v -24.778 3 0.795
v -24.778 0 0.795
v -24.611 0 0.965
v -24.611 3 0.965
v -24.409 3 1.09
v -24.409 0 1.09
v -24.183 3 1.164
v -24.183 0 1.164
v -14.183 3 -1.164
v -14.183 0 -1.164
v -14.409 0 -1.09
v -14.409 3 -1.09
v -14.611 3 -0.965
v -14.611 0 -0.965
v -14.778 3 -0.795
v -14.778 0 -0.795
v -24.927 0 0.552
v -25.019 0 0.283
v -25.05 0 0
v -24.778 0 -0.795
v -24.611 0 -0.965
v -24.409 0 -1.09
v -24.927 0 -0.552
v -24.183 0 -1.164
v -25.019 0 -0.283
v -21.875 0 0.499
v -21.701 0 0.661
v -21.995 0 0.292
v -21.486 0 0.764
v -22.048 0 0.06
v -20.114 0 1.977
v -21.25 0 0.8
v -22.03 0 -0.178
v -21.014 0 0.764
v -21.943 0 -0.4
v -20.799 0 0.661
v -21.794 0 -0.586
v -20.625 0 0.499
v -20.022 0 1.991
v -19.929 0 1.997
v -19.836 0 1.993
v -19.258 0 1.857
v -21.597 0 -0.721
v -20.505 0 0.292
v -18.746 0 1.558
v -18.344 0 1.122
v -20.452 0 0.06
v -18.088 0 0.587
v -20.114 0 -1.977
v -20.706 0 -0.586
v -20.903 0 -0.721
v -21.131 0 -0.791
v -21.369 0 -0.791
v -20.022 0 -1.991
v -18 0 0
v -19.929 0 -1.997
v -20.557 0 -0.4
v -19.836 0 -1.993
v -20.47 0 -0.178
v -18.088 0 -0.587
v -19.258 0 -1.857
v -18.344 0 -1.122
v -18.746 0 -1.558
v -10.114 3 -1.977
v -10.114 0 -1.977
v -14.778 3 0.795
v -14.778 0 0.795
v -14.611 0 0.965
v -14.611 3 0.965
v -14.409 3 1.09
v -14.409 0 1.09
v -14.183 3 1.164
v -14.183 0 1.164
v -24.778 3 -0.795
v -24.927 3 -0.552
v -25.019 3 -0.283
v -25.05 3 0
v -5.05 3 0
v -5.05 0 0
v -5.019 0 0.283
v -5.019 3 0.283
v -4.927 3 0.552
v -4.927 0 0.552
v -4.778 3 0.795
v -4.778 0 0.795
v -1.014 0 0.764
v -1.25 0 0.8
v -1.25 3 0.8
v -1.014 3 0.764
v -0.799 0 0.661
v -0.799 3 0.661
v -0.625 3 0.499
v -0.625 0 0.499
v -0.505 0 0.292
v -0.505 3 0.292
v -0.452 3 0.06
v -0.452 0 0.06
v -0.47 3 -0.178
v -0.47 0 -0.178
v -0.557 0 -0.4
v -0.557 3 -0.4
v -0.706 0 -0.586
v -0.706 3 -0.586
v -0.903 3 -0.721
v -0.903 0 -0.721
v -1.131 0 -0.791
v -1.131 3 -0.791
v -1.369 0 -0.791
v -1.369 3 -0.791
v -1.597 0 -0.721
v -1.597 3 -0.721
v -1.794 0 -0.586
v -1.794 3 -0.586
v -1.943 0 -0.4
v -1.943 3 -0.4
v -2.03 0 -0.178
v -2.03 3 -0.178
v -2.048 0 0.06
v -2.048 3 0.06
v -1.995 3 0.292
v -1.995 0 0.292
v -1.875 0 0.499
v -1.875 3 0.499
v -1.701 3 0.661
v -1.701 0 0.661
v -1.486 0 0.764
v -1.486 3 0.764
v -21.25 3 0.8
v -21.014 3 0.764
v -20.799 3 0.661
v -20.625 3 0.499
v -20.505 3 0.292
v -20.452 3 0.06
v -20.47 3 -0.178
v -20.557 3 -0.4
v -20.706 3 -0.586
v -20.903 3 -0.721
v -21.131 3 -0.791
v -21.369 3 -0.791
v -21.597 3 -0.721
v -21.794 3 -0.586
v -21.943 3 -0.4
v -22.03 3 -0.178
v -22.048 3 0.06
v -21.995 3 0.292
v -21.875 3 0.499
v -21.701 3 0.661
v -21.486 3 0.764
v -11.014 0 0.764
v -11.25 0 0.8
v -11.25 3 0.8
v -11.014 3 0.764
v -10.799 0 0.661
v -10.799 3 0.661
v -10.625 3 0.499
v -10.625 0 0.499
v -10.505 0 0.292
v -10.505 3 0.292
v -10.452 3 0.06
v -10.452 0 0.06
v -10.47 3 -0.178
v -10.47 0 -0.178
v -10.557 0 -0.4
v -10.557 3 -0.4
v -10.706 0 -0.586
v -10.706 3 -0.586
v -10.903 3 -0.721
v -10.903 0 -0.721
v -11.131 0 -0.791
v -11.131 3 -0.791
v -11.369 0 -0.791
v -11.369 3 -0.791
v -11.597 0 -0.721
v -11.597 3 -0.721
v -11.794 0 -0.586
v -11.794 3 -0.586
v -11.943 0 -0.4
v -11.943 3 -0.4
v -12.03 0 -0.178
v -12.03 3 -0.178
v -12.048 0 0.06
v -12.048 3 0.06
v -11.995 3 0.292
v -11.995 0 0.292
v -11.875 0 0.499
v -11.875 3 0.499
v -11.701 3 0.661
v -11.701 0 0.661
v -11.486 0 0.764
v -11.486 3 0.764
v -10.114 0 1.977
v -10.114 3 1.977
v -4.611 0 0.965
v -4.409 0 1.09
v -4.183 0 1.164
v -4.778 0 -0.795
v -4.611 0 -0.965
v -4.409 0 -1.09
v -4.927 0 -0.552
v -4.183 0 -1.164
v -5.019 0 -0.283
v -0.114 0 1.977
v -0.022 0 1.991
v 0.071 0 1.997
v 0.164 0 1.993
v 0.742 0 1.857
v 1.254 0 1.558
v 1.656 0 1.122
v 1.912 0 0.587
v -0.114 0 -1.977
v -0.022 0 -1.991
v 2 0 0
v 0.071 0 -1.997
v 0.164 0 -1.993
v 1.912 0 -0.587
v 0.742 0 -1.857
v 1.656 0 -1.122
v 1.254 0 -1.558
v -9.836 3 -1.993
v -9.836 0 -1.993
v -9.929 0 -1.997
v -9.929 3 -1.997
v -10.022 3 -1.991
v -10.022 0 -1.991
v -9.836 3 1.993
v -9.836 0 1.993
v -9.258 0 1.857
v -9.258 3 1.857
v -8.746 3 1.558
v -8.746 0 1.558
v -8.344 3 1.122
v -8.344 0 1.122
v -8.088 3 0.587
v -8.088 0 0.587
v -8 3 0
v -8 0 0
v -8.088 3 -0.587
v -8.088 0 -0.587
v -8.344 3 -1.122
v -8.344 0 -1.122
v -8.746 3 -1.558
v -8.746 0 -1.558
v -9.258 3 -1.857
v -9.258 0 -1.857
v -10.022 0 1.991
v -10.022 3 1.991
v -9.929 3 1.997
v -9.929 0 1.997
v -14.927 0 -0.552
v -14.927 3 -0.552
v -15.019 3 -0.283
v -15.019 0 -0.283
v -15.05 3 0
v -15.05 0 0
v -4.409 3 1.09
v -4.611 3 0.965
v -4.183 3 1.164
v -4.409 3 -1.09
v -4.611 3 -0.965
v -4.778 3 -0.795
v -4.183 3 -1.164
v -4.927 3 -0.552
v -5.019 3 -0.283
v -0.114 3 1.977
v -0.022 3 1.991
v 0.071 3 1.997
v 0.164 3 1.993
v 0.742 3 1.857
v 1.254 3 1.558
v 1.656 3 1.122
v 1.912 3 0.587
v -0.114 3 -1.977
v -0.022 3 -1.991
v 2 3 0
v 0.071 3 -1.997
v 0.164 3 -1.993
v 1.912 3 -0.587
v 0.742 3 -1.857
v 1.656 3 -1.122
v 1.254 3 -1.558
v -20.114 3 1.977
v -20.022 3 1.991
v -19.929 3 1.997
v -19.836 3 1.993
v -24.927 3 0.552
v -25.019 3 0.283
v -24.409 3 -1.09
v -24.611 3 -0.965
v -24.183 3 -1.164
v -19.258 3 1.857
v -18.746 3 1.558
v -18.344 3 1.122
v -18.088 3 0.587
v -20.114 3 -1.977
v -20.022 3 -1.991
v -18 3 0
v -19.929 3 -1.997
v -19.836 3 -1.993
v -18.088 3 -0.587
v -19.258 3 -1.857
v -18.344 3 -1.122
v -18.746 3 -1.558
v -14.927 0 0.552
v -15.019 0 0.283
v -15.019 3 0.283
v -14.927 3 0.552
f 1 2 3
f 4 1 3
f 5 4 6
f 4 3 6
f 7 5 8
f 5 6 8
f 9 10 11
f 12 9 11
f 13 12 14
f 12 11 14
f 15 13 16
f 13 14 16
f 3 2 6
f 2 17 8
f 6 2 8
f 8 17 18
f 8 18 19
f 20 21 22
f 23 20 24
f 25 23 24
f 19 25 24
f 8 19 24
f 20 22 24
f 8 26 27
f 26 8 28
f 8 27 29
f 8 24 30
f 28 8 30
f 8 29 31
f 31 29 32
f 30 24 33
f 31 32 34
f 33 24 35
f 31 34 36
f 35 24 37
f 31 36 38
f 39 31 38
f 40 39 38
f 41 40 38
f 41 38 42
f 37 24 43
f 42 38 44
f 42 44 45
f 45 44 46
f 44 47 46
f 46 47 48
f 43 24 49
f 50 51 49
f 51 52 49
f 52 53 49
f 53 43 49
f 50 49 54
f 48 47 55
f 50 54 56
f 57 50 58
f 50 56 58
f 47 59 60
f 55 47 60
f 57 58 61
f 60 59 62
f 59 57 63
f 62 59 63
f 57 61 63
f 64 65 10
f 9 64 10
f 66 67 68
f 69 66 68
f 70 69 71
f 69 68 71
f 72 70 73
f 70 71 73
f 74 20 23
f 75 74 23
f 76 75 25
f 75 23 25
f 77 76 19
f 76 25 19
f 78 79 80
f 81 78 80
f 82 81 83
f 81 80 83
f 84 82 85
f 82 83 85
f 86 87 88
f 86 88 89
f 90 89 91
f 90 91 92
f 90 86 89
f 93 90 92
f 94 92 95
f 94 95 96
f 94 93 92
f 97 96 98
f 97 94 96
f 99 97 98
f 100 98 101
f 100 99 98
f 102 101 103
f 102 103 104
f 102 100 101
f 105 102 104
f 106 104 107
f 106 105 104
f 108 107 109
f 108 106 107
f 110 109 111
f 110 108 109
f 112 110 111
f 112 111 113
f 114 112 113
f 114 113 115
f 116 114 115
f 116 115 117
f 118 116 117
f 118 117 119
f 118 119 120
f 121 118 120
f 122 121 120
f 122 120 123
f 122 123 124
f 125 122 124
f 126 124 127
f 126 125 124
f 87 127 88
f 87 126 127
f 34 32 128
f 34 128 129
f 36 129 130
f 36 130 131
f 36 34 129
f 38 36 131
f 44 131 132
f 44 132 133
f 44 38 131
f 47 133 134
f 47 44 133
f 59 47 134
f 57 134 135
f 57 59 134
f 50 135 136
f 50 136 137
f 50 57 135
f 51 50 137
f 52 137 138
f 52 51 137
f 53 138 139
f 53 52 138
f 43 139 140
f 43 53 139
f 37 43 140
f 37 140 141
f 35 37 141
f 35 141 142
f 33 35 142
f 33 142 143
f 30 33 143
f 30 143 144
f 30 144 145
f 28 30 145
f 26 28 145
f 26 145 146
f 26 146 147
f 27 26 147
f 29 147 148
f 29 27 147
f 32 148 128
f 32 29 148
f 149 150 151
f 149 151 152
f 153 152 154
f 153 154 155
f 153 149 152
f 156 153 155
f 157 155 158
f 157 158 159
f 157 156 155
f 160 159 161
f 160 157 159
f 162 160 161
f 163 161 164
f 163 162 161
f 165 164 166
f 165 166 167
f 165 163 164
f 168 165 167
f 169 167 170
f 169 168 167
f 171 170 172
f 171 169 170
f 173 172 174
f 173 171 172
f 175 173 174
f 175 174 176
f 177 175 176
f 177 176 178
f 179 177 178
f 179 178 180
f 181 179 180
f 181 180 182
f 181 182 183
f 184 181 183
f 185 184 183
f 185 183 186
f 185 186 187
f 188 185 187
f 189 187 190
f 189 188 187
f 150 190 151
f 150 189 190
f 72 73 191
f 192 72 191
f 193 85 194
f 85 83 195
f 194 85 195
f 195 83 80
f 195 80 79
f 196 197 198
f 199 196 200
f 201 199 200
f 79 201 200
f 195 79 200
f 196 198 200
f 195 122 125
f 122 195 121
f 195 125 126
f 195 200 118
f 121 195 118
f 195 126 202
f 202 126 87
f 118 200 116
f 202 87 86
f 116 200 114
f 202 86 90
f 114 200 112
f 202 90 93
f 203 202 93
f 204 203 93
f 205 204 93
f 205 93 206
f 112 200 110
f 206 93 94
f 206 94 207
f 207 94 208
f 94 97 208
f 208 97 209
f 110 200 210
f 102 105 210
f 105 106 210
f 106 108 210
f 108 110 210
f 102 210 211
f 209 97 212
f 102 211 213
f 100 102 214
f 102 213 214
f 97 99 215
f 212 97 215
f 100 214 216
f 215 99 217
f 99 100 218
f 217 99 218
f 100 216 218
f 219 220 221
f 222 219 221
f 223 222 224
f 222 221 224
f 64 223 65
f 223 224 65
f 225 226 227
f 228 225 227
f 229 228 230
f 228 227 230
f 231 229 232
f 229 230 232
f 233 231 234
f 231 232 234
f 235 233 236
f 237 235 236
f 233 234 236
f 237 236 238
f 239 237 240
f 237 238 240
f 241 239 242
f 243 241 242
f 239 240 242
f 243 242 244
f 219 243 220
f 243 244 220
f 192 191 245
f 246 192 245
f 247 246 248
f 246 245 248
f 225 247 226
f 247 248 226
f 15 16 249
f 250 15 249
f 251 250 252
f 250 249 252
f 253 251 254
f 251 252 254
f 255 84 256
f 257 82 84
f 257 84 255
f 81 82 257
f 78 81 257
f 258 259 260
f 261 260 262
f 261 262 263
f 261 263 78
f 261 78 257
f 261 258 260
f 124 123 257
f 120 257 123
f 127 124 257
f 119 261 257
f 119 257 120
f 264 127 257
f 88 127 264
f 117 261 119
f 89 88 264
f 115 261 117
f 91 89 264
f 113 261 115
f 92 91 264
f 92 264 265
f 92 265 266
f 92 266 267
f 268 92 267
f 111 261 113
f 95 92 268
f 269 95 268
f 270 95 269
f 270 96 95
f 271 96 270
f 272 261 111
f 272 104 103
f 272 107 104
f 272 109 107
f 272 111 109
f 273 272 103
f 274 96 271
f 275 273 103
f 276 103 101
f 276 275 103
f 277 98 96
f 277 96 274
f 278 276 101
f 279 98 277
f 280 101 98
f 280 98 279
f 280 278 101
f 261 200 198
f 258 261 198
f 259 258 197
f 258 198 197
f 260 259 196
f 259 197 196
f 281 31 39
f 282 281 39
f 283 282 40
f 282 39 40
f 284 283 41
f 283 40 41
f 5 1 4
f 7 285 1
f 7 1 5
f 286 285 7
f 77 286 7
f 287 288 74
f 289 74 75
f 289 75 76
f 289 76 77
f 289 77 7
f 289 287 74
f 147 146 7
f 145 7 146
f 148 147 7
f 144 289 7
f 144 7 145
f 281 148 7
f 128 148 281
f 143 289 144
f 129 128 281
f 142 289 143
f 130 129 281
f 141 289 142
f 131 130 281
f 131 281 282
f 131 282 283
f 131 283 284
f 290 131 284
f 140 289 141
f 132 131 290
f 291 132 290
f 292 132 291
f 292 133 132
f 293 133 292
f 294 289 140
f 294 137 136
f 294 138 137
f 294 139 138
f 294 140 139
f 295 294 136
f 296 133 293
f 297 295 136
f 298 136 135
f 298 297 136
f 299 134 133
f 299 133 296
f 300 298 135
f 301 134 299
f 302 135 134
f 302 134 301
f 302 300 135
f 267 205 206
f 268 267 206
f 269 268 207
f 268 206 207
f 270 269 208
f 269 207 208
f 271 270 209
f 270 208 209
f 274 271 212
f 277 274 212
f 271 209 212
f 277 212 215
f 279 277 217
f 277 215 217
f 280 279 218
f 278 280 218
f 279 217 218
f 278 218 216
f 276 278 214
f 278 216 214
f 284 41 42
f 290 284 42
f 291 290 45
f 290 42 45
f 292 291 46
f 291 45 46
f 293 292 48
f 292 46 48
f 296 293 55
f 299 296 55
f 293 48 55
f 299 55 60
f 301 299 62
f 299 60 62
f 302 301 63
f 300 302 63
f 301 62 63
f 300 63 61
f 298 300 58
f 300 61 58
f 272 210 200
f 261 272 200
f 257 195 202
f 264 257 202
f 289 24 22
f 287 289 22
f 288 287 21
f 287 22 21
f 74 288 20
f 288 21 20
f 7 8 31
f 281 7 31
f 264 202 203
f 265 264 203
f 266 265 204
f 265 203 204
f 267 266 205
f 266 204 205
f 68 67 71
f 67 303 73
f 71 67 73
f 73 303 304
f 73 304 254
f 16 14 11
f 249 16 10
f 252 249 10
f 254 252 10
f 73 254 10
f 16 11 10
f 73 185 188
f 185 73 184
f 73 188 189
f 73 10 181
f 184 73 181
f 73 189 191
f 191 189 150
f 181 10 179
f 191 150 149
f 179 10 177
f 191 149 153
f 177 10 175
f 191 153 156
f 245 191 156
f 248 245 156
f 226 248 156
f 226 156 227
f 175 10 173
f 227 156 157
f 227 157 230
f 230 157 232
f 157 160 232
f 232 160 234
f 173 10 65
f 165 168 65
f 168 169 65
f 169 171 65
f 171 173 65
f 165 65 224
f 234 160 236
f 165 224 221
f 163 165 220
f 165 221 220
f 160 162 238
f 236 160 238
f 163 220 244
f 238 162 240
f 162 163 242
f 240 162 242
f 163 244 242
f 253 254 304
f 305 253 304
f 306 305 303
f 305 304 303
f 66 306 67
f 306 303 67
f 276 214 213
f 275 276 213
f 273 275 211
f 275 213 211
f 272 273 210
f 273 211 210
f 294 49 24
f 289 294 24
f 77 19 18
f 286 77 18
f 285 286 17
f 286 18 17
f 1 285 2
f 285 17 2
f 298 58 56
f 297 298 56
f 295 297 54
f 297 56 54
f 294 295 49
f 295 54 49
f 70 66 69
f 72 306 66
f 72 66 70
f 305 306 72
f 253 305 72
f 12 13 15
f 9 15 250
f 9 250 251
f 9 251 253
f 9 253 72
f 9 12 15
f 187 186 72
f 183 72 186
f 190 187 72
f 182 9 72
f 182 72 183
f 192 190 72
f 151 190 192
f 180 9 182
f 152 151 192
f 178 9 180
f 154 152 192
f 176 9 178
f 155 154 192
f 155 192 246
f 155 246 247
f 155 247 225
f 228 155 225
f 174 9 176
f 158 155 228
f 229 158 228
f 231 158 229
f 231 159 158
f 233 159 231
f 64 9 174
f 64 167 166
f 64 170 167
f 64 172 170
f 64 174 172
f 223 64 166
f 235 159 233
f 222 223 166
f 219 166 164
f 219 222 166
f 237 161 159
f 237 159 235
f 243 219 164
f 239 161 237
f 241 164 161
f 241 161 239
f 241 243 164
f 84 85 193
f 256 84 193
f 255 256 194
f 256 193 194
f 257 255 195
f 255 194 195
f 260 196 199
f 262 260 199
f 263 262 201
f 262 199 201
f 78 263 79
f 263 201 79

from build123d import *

# Parameters (mm, degrees)
SKETCH1_R           = 0.8
BOSS_EXTRUDE1_DEPTH = 3
LPATTERN1_COUNT     = 3
LPATTERN1_PITCH     = 10


with BuildPart() as part:
    # Sketch1 → Boss-Extrude1 (new body)
    with BuildSketch(Plane(origin=(0, 0, 0), x_dir=(1, 0, 0), z_dir=(0, 1, 0))):
        with BuildLine():
            ThreePointArc((0.164100898, -1.993256355), (2, -1e-09), (0.1641009, 1.993256355))
            ThreePointArc((0.1641009, 1.993256355), (0.024548565, 1.994973575), (-0.113883759, 1.977245221))
            Line((-0.113883759, 1.977245221), (-4.183235691, 1.164159973))
            ThreePointArc((-4.183235691, 1.164159973), (-4.514100231, 1.033532975), (-4.77830642, 0.795352694))
            ThreePointArc((-4.77830642, 0.795352694), (-4.980202899, 0.420239012), (-5.05, 0))
            ThreePointArc((-5.05, 0), (-4.980202899, -0.420239012), (-4.77830642, -0.795352694))
            ThreePointArc((-4.77830642, -0.795352694), (-4.514100231, -1.033532975), (-4.183235691, -1.164159973))
            Line((-4.183235691, -1.164159973), (-0.11388376, -1.977245221))
            ThreePointArc((-0.11388376, -1.977245221), (0.024548564, -1.994973575), (0.164100898, -1.993256355))
        make_face()
        with Locations(Location((-1.25, 0, 0), (0, 0, 270))):
            Circle(SKETCH1_R, mode=Mode.SUBTRACT)
    extrude(amount=BOSS_EXTRUDE1_DEPTH)


with BuildPart() as lpattern1_1:
    # LPattern1: pattern copy
    add(part.part.moved(Location(Vector(-1, 0, 0) * (1 * LPATTERN1_PITCH))))


with BuildPart() as lpattern1_2:
    # LPattern1: pattern copy
    add(part.part.moved(Location(Vector(-1, 0, 0) * (2 * LPATTERN1_PITCH))))


solid = Compound([part.part, lpattern1_1.part, lpattern1_2.part])
